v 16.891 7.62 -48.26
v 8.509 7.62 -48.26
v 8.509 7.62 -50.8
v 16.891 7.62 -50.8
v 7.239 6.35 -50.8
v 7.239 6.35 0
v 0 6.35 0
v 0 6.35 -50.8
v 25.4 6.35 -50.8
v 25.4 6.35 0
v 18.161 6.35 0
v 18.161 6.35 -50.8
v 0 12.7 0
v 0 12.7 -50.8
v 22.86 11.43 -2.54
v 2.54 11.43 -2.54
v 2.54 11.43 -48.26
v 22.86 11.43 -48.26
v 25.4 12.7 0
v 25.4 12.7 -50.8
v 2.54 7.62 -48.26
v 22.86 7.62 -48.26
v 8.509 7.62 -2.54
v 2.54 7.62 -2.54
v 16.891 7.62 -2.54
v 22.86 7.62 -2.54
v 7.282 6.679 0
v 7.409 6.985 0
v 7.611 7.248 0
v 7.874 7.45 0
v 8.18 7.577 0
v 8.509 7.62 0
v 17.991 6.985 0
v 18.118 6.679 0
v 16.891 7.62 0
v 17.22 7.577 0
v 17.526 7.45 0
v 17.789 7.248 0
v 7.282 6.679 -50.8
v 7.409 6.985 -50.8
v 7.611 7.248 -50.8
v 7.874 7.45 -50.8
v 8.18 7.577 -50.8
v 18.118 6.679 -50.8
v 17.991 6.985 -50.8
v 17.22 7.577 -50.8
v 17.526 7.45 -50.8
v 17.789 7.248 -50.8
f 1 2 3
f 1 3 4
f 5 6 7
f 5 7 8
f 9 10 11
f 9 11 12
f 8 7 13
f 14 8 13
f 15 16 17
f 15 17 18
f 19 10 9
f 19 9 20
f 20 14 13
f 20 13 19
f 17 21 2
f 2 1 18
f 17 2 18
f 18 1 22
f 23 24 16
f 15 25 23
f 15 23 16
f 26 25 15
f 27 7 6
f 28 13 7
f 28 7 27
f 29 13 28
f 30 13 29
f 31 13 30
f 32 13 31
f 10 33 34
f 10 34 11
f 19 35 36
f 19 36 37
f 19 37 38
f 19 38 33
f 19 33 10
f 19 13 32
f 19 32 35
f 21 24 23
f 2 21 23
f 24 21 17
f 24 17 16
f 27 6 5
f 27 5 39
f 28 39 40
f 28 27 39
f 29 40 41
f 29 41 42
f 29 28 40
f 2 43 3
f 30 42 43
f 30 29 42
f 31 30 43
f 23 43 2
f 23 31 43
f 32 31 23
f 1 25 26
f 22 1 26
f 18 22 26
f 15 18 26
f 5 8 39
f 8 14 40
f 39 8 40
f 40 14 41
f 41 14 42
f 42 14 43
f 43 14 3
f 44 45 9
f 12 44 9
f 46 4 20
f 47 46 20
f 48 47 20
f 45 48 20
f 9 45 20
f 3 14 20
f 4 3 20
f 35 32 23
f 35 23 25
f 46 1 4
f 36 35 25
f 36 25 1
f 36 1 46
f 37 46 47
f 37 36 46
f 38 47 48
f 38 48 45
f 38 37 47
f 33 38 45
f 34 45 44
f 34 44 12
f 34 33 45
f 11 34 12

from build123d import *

# Parameters (mm, degrees)
SKETCH1_W           = 25.4
SKETCH1_H           = 12.7
BOSS_EXTRUDE1_DEPTH = 50.8
CUT_EXTRUDE1_DEPTH  = 50.8
SKETCH3_W           = 50.8
SKETCH3_H           = 6.35
CUT_EXTRUDE3_DEPTH  = 59.198711326
SKETCH5_W           = 20.32
SKETCH5_H           = 45.72
CUT_EXTRUDE4_DEPTH  = 3.81


with BuildPart() as part:
    # Sketch1 → Boss-Extrude1 (new body)
    with BuildSketch(Plane.XY):
        with Locations((12.7, 6.35)):
            Rectangle(SKETCH1_W, SKETCH1_H)
    extrude(amount=-BOSS_EXTRUDE1_DEPTH)

    # Sketch2 → Cut-Extrude1 (cut)
    with BuildSketch(Plane.XY):
        with BuildLine():
            Line((8.509, 7.62), (16.891, 7.62))
            ThreePointArc((16.891, 7.62), (18.161, 6.35), (16.891, 5.08))
            Line((16.891, 5.08), (8.509, 5.08))
            ThreePointArc((8.509, 5.08), (7.239, 6.35), (8.509, 7.62))
        make_face()
    extrude(amount=-CUT_EXTRUDE1_DEPTH, mode=Mode.SUBTRACT)

    # Sketch3 → Cut-Extrude3 (cut, through all)
    with BuildSketch(Plane(origin=(25.4, 0, 0), x_dir=(0, 0, -1), z_dir=(1, 0, 0))):
        with Locations((25.4, 3.175)):
            Rectangle(SKETCH3_W, SKETCH3_H)
    extrude(amount=-CUT_EXTRUDE3_DEPTH, mode=Mode.SUBTRACT)

    # Sketch5 → Cut-Extrude4 (cut)
    with BuildSketch(Plane.XZ.offset(-7.62)):
        with Locations((12.7, -25.4)):
            Rectangle(SKETCH5_W, SKETCH5_H)
    extrude(amount=-CUT_EXTRUDE4_DEPTH, mode=Mode.SUBTRACT)


solid = part.part
